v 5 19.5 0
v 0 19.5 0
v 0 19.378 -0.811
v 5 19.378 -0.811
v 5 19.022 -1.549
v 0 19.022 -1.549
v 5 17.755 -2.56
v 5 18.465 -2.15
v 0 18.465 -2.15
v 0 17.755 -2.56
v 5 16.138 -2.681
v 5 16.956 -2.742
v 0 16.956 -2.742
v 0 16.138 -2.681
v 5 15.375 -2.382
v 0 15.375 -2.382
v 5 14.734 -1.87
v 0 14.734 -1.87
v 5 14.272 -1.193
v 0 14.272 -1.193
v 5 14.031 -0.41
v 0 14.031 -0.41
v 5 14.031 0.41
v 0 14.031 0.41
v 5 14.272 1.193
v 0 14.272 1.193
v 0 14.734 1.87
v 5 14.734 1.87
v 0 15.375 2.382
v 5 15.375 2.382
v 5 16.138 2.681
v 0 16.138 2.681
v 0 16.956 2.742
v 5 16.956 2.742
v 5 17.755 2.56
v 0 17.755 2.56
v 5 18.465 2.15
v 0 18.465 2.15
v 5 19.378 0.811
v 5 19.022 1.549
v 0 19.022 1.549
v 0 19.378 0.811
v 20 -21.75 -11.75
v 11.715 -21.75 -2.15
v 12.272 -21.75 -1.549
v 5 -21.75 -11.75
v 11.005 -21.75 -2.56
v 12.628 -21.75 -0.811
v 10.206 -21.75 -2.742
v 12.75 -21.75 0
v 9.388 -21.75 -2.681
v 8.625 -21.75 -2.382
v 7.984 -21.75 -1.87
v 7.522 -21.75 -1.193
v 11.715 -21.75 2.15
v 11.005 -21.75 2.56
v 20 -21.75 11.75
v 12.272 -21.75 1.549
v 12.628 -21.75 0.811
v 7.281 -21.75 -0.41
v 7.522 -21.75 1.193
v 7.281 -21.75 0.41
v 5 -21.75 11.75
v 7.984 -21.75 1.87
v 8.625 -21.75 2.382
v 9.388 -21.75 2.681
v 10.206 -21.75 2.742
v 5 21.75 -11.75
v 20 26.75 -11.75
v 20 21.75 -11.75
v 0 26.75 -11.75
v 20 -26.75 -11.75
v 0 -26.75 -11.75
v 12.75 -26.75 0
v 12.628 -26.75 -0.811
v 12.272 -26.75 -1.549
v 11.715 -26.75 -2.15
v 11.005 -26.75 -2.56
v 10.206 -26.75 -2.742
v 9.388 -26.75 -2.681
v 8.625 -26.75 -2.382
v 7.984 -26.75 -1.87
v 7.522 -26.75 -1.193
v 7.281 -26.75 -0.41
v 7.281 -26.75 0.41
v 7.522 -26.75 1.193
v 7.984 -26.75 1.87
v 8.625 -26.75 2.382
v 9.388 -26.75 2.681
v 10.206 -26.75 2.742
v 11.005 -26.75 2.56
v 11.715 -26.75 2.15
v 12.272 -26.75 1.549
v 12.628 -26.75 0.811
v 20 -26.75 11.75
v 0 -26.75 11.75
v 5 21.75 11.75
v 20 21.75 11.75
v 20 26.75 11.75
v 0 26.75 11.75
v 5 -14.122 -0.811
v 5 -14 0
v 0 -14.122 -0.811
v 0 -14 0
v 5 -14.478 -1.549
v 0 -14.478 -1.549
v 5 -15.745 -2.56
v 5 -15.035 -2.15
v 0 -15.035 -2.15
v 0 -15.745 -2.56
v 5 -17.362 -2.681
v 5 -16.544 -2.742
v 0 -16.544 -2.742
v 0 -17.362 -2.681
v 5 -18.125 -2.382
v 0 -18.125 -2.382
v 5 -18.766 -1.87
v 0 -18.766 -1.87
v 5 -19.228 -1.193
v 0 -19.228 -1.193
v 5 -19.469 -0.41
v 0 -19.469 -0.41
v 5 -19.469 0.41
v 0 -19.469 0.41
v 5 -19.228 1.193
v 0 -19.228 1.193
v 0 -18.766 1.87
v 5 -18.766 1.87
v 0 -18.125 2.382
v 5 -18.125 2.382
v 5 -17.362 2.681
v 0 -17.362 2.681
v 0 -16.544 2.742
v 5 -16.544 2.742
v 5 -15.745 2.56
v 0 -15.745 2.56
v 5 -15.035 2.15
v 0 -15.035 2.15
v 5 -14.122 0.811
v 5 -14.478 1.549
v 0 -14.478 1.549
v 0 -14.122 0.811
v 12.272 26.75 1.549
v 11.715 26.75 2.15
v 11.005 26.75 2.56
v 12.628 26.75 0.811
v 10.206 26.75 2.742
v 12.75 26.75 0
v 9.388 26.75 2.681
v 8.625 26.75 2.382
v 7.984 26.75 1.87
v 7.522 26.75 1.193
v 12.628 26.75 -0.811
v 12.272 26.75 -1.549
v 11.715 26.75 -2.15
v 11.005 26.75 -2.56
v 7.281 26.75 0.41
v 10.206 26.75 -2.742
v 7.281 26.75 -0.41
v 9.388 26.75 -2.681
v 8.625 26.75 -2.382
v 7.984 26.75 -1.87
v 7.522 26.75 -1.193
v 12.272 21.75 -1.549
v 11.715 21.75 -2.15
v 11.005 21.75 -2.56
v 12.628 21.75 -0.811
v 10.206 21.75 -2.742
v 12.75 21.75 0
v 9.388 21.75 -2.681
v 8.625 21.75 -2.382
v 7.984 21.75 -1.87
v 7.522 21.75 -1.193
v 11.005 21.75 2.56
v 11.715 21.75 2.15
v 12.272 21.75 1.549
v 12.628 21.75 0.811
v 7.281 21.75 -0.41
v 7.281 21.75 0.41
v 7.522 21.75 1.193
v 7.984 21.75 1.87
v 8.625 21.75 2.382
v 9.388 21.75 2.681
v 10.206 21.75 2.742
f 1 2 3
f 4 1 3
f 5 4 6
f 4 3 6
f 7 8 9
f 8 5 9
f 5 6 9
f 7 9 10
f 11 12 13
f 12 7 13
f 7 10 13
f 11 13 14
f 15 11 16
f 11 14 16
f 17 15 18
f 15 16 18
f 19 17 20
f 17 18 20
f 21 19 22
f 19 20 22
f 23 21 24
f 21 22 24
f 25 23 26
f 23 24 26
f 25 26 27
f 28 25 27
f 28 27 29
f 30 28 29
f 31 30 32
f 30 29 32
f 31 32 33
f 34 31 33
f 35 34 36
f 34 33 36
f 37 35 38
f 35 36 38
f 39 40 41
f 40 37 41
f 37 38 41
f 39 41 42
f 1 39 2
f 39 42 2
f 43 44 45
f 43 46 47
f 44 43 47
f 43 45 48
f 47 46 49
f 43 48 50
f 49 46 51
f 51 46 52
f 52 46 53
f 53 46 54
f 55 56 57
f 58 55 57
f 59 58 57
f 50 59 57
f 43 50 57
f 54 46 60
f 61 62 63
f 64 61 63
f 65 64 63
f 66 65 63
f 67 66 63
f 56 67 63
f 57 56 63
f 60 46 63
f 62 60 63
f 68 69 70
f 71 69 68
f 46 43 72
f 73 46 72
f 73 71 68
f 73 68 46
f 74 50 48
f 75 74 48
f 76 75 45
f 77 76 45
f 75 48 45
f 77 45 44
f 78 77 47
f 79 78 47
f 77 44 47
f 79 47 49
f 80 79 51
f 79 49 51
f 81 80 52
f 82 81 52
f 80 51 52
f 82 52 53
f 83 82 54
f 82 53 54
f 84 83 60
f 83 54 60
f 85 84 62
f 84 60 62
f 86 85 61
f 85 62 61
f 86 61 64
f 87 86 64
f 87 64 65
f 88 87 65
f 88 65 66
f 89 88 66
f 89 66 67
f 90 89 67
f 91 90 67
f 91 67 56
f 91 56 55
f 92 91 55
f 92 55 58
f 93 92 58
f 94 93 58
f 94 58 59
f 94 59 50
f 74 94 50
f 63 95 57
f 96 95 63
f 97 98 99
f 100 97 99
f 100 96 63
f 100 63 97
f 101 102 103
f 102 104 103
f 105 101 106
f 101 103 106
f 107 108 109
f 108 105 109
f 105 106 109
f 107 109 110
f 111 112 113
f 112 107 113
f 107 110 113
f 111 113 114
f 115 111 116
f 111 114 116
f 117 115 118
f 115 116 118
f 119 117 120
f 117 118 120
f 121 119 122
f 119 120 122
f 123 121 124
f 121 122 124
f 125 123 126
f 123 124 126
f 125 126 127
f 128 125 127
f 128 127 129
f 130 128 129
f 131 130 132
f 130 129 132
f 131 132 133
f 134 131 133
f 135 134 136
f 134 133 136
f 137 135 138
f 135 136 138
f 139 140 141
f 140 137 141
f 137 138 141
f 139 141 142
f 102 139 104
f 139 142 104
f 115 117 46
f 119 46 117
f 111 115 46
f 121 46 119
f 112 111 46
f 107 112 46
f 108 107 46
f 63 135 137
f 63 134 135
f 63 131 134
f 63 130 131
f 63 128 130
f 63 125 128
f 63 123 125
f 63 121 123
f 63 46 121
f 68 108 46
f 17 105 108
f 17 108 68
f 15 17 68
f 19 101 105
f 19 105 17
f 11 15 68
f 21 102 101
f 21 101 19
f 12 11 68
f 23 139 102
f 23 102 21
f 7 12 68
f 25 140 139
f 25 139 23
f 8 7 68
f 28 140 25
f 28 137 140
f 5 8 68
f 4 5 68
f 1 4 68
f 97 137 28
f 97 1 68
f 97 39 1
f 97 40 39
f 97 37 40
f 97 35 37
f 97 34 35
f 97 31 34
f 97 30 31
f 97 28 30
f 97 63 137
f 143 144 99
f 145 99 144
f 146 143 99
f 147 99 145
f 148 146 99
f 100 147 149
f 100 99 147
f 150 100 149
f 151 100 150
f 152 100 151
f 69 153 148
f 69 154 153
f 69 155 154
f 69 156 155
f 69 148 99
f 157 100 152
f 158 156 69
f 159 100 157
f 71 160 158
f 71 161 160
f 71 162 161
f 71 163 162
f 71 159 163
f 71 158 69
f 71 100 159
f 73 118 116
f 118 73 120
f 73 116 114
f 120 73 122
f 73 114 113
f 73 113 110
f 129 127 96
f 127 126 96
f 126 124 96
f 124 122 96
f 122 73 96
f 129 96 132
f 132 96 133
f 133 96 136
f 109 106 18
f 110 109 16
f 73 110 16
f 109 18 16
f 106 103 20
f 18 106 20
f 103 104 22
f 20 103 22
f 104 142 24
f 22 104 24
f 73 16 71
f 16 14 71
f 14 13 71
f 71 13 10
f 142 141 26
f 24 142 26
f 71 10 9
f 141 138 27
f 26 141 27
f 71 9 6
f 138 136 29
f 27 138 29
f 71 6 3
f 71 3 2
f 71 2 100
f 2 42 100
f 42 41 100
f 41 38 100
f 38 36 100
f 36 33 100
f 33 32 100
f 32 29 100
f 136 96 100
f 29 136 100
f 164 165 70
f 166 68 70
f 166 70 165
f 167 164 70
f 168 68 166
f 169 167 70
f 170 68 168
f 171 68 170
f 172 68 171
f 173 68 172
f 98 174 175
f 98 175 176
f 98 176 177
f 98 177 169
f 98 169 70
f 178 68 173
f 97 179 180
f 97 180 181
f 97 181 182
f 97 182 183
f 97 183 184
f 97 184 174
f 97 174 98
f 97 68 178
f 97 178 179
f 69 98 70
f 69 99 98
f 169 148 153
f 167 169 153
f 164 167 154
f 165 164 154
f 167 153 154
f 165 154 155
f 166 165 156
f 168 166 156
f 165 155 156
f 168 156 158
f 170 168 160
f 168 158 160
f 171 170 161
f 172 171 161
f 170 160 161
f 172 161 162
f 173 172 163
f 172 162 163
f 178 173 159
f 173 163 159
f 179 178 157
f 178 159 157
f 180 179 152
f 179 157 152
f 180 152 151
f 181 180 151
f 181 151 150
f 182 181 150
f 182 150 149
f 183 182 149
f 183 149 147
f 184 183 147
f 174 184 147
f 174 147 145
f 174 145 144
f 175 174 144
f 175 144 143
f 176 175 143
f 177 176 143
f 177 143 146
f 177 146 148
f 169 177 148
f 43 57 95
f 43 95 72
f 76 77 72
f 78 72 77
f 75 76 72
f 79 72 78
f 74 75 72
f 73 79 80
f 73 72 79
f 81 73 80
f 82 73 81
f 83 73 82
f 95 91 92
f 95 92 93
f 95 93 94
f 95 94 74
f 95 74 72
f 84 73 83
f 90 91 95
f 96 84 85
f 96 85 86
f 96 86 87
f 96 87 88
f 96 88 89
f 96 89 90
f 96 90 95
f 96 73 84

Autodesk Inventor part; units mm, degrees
ref_plane "YZ Plane" through (0, 0, 0) normal (1, 0, 0) x (0, 1, 0)
ref_plane "XZ Plane" through (0, 0, 0) normal (0, 1, 0) x (-1, 0, 0)
ref_plane "XY Plane" through (0, 0, 0) normal (0, 0, 1) x (1, 0, 0)
sketch "Sketch1" plane through (0, 0, 0) normal (1, 0, 0) x (0, 1, 0)
  line L0 (-26.75, 11.75) -> (26.75, 11.75)
  line L1 (26.75, 11.75) -> (26.75, -11.75)
  line L2 (26.75, -11.75) -> (-26.75, -11.75)
  line L3 (-26.75, -11.75) -> (-26.75, 11.75)
  line L4 (-26.75, 11.75) -> (26.75, -11.75) construction
  line L5 (26.75, 11.75) -> (-26.75, -11.75) construction
  circle A0 centre (16.75, 0) radius 2.75
  circle A1 centre (-16.75, 0) radius 2.75
  point P0 (0, 0)
  dimension "d0" = 53.5
  dimension "d1" = 23.5
  dimension "d2" = 5.5
  dimension "d3" = 5.5
  dimension "d4" = 10
  dimension "d5" = 10
  dimension "d6" = 11.75
  dimension "d7" = 11.75
extrude "Extrusion1" add sketch "Sketch1" along normal blind 5
sketch "Sketch2" plane through (5, 0, 0) normal (1, 0, 0) x (0, 0, -1)
  line L0 (-11.75, 26.75) -> (-11.75, -26.75) projected
  line L1 (-11.75, 26.75) -> (11.75, 26.75)
  line L2 (11.75, 26.75) -> (11.75, 21.75)
  line L3 (11.75, 21.75) -> (-11.75, 21.75)
  line L4 (-11.75, 21.75) -> (-11.75, 26.75)
  line L5 (-11.75, -26.75) -> (11.75, -26.75) projected
  line L6 (-11.75, -26.75) -> (11.75, -26.75)
  line L7 (11.75, -26.75) -> (11.75, -21.75)
  line L8 (11.75, -21.75) -> (-11.75, -21.75)
  line L9 (-11.75, -21.75) -> (-11.75, -26.75)
  point P0 (0, 0)
  dimension "d10" = 23.5
  dimension "d11" = 5
  dimension "d12" = 23.5
  dimension "d13" = 5
extrude "Extrusion2" add sketch "Sketch2" along normal blind 15
sketch "Sketch3" plane through (0, 26.75, 11.75) normal (0, 1, 0) x (1, 0, 0)
  circle A0 centre (10, 11.75) radius 2.75
  line L0 (0, 0) -> (0, 23.5) projected
  line L1 (0, 0) -> (20, 0) projected
  point P0 (0, 11.75)
  dimension "d16" = 5.5
  dimension "d17" = 10
  dimension "d18" = 11.75
extrude "Extrusion3" cut sketch "Sketch3" against normal up to surface (53.5 mm away)
properties part number "Extrusion ends" material "Aluminum 6061"
